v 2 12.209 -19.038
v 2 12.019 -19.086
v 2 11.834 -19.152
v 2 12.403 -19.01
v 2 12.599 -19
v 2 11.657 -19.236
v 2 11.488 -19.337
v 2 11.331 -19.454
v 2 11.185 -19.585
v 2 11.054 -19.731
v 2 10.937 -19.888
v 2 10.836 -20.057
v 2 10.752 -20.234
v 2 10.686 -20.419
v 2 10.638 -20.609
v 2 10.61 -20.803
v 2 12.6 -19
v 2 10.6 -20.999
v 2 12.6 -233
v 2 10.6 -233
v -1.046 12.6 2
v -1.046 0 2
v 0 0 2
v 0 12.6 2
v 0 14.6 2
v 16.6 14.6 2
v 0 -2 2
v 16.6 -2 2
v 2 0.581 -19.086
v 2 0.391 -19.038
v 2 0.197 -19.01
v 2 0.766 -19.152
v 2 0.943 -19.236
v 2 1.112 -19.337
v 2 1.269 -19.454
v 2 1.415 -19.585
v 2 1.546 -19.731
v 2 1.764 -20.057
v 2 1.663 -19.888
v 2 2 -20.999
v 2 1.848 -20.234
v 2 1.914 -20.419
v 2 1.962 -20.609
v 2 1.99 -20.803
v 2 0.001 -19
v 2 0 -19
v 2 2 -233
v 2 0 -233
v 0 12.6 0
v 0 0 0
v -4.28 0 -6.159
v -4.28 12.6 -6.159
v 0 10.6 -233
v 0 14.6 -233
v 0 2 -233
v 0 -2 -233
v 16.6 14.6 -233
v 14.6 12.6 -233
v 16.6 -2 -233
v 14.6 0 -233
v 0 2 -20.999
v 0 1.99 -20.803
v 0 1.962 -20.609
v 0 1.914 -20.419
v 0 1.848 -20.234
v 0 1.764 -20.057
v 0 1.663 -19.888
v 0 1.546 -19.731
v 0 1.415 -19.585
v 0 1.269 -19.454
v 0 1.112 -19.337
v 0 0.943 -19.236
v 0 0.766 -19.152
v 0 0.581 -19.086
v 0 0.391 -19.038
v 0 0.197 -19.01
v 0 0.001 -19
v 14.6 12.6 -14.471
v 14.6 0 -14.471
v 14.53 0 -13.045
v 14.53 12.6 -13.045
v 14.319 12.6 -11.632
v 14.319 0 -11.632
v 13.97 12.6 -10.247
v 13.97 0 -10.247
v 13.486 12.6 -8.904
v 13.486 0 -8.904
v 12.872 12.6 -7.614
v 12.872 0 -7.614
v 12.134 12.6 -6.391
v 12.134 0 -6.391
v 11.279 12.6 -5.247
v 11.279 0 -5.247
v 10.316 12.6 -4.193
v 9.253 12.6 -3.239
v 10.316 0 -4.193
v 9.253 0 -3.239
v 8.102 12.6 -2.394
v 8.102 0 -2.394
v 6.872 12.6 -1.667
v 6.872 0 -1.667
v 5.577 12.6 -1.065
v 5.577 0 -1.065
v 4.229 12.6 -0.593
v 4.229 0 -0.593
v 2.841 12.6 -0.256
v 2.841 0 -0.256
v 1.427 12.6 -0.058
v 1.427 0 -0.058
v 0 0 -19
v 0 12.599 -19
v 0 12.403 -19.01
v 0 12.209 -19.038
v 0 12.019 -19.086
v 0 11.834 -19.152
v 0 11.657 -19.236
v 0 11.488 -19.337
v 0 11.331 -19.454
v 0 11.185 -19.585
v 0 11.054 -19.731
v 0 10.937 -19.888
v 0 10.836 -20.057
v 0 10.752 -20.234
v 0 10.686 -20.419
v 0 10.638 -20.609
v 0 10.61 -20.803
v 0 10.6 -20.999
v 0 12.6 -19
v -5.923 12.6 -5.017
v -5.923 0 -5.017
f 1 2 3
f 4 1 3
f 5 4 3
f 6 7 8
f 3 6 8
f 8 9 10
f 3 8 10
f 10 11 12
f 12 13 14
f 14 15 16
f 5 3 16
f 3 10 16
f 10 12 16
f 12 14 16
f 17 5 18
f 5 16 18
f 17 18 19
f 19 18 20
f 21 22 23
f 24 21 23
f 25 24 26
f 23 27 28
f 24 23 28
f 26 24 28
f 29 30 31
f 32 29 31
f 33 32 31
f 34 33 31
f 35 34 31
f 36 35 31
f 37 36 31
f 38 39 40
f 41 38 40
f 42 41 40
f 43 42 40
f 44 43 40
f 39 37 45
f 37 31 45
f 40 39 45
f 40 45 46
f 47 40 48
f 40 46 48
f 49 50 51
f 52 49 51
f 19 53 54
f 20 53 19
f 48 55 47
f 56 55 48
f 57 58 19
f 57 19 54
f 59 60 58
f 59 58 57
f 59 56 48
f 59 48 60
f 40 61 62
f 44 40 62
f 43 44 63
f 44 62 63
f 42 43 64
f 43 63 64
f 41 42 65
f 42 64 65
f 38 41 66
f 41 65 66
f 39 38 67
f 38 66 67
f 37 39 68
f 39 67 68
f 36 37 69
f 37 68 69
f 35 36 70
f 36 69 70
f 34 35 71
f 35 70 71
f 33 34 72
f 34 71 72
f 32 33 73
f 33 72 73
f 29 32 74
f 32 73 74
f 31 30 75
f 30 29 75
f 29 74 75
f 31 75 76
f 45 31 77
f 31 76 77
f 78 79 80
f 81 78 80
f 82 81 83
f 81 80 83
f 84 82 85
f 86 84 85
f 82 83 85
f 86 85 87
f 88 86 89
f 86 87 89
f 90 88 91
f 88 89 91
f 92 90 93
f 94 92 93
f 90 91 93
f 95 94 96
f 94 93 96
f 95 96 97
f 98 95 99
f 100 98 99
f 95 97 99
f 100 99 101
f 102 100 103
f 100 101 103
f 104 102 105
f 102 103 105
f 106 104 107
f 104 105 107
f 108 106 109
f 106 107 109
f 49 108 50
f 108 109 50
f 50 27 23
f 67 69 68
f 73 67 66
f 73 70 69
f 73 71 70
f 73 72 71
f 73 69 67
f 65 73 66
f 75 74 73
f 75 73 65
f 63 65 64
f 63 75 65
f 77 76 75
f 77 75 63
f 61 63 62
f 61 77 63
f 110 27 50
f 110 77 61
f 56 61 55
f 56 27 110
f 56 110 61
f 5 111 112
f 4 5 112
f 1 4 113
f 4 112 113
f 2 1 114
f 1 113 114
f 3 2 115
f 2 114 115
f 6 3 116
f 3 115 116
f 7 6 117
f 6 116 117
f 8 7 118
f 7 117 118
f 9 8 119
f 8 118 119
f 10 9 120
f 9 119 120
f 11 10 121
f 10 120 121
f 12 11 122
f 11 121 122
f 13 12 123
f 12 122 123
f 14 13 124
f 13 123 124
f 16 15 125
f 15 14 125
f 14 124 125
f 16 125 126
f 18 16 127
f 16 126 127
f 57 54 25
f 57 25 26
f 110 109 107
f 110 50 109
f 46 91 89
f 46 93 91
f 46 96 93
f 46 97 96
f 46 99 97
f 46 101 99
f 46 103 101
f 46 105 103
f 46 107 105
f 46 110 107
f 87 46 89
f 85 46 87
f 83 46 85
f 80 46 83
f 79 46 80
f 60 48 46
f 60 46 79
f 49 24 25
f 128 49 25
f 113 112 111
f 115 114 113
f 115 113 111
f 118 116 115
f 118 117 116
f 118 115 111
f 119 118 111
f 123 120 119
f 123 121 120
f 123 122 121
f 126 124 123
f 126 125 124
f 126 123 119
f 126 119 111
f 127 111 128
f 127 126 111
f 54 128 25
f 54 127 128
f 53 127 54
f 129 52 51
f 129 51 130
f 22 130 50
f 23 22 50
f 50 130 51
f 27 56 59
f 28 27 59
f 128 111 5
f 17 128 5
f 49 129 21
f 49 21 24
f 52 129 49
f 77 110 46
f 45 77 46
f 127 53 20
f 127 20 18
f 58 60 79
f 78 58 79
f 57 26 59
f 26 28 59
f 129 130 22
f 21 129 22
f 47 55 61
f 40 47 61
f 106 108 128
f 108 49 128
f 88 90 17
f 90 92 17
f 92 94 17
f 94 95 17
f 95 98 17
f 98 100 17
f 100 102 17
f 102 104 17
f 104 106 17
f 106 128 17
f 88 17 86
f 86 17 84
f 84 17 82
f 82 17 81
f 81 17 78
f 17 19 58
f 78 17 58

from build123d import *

# Parameters (mm, degrees)
SKETCH1_W           = 16.6
SKETCH1_H           = 235
BOSS_EXTRUDE1_DEPTH = 2
SKETCH1_6_W         = 2
SKETCH1_6_H         = 214
BOSS_EXTRUDE3_DEPTH = 12.6
SKETCH3_W           = 16.6
SKETCH3_H           = 235
BOSS_EXTRUDE4_DEPTH = 2
SKETCH4_W           = 214
SKETCH4_H           = 8.6
CUT_EXTRUDE1_DEPTH  = 4
CUT_EXTRUDE2_DEPTH  = 4


with BuildPart() as part:
    # Sketch1 → Boss-Extrude1 (new body)
    with BuildSketch(Plane(origin=(0, 0, 0), x_dir=(1, 0, 0), z_dir=(0, 1, 0))):
        with Locations((8.3, 115.5)):
            Rectangle(SKETCH1_W, SKETCH1_H)
    extrude(amount=-BOSS_EXTRUDE1_DEPTH)

    # Sketch1<6> → Boss-Extrude3 (add)
    with BuildSketch(Plane(origin=(0, 0, 0), x_dir=(1, 0, 0), z_dir=(0, 1, 0))):
        with BuildLine():
            Line((-1.045606528, -2), (16.6, -2))
            Line((16.6, -2), (16.6, 233))
            Line((16.6, 233), (14.6, 233))
            Line((14.6, 233), (14.6, 14.47143967))
            ThreePointArc((14.6, 14.47143967), (10.315894346, 4.193033104), (0, 0))
            Line((0, 0), (-4.280197972, 6.15872595))
            Line((-4.280197972, 6.15872595), (-5.922524892, 5.017339824))
            Line((-5.922524892, 5.017339824), (-1.045606528, -2))
        make_face()
        with Locations((1, 126)):
            Rectangle(SKETCH1_6_W, SKETCH1_6_H)
    extrude(amount=BOSS_EXTRUDE3_DEPTH)

    # Sketch3 → Boss-Extrude4 (add)
    with BuildSketch(Plane(origin=(0, 12.6, 0), x_dir=(1, 0, 0), z_dir=(0, 1, 0))):
        with Locations((8.3, 115.5)):
            Rectangle(SKETCH3_W, SKETCH3_H)
    extrude(amount=BOSS_EXTRUDE4_DEPTH)

    # Sketch4 → Cut-Extrude1 (cut)
    with BuildSketch(Plane.ZY):
        with Locations((-126, 6.3)):
            Rectangle(SKETCH4_W, SKETCH4_H)
    extrude(amount=-CUT_EXTRUDE1_DEPTH, mode=Mode.SUBTRACT)

    # Sketch6 → Cut-Extrude2 (cut)
    with BuildSketch(Plane.ZY):
        with BuildLine():
            ThreePointArc((-20.999, 2), (-19.585493544, 1.414506456), (-19, 0.001))
            Line((-19, 0.001), (-19, 2))
            Line((-19, 2), (-20.999, 2))
        make_face()
        with BuildLine():
            Line((-19, 10.6), (-19, 12.599))
            ThreePointArc((-19, 12.599), (-19.585493544, 11.185493544), (-20.999, 10.6))
            Line((-20.999, 10.6), (-19, 10.6))
        make_face()
    extrude(amount=-CUT_EXTRUDE2_DEPTH, mode=Mode.SUBTRACT)


solid = part.part
